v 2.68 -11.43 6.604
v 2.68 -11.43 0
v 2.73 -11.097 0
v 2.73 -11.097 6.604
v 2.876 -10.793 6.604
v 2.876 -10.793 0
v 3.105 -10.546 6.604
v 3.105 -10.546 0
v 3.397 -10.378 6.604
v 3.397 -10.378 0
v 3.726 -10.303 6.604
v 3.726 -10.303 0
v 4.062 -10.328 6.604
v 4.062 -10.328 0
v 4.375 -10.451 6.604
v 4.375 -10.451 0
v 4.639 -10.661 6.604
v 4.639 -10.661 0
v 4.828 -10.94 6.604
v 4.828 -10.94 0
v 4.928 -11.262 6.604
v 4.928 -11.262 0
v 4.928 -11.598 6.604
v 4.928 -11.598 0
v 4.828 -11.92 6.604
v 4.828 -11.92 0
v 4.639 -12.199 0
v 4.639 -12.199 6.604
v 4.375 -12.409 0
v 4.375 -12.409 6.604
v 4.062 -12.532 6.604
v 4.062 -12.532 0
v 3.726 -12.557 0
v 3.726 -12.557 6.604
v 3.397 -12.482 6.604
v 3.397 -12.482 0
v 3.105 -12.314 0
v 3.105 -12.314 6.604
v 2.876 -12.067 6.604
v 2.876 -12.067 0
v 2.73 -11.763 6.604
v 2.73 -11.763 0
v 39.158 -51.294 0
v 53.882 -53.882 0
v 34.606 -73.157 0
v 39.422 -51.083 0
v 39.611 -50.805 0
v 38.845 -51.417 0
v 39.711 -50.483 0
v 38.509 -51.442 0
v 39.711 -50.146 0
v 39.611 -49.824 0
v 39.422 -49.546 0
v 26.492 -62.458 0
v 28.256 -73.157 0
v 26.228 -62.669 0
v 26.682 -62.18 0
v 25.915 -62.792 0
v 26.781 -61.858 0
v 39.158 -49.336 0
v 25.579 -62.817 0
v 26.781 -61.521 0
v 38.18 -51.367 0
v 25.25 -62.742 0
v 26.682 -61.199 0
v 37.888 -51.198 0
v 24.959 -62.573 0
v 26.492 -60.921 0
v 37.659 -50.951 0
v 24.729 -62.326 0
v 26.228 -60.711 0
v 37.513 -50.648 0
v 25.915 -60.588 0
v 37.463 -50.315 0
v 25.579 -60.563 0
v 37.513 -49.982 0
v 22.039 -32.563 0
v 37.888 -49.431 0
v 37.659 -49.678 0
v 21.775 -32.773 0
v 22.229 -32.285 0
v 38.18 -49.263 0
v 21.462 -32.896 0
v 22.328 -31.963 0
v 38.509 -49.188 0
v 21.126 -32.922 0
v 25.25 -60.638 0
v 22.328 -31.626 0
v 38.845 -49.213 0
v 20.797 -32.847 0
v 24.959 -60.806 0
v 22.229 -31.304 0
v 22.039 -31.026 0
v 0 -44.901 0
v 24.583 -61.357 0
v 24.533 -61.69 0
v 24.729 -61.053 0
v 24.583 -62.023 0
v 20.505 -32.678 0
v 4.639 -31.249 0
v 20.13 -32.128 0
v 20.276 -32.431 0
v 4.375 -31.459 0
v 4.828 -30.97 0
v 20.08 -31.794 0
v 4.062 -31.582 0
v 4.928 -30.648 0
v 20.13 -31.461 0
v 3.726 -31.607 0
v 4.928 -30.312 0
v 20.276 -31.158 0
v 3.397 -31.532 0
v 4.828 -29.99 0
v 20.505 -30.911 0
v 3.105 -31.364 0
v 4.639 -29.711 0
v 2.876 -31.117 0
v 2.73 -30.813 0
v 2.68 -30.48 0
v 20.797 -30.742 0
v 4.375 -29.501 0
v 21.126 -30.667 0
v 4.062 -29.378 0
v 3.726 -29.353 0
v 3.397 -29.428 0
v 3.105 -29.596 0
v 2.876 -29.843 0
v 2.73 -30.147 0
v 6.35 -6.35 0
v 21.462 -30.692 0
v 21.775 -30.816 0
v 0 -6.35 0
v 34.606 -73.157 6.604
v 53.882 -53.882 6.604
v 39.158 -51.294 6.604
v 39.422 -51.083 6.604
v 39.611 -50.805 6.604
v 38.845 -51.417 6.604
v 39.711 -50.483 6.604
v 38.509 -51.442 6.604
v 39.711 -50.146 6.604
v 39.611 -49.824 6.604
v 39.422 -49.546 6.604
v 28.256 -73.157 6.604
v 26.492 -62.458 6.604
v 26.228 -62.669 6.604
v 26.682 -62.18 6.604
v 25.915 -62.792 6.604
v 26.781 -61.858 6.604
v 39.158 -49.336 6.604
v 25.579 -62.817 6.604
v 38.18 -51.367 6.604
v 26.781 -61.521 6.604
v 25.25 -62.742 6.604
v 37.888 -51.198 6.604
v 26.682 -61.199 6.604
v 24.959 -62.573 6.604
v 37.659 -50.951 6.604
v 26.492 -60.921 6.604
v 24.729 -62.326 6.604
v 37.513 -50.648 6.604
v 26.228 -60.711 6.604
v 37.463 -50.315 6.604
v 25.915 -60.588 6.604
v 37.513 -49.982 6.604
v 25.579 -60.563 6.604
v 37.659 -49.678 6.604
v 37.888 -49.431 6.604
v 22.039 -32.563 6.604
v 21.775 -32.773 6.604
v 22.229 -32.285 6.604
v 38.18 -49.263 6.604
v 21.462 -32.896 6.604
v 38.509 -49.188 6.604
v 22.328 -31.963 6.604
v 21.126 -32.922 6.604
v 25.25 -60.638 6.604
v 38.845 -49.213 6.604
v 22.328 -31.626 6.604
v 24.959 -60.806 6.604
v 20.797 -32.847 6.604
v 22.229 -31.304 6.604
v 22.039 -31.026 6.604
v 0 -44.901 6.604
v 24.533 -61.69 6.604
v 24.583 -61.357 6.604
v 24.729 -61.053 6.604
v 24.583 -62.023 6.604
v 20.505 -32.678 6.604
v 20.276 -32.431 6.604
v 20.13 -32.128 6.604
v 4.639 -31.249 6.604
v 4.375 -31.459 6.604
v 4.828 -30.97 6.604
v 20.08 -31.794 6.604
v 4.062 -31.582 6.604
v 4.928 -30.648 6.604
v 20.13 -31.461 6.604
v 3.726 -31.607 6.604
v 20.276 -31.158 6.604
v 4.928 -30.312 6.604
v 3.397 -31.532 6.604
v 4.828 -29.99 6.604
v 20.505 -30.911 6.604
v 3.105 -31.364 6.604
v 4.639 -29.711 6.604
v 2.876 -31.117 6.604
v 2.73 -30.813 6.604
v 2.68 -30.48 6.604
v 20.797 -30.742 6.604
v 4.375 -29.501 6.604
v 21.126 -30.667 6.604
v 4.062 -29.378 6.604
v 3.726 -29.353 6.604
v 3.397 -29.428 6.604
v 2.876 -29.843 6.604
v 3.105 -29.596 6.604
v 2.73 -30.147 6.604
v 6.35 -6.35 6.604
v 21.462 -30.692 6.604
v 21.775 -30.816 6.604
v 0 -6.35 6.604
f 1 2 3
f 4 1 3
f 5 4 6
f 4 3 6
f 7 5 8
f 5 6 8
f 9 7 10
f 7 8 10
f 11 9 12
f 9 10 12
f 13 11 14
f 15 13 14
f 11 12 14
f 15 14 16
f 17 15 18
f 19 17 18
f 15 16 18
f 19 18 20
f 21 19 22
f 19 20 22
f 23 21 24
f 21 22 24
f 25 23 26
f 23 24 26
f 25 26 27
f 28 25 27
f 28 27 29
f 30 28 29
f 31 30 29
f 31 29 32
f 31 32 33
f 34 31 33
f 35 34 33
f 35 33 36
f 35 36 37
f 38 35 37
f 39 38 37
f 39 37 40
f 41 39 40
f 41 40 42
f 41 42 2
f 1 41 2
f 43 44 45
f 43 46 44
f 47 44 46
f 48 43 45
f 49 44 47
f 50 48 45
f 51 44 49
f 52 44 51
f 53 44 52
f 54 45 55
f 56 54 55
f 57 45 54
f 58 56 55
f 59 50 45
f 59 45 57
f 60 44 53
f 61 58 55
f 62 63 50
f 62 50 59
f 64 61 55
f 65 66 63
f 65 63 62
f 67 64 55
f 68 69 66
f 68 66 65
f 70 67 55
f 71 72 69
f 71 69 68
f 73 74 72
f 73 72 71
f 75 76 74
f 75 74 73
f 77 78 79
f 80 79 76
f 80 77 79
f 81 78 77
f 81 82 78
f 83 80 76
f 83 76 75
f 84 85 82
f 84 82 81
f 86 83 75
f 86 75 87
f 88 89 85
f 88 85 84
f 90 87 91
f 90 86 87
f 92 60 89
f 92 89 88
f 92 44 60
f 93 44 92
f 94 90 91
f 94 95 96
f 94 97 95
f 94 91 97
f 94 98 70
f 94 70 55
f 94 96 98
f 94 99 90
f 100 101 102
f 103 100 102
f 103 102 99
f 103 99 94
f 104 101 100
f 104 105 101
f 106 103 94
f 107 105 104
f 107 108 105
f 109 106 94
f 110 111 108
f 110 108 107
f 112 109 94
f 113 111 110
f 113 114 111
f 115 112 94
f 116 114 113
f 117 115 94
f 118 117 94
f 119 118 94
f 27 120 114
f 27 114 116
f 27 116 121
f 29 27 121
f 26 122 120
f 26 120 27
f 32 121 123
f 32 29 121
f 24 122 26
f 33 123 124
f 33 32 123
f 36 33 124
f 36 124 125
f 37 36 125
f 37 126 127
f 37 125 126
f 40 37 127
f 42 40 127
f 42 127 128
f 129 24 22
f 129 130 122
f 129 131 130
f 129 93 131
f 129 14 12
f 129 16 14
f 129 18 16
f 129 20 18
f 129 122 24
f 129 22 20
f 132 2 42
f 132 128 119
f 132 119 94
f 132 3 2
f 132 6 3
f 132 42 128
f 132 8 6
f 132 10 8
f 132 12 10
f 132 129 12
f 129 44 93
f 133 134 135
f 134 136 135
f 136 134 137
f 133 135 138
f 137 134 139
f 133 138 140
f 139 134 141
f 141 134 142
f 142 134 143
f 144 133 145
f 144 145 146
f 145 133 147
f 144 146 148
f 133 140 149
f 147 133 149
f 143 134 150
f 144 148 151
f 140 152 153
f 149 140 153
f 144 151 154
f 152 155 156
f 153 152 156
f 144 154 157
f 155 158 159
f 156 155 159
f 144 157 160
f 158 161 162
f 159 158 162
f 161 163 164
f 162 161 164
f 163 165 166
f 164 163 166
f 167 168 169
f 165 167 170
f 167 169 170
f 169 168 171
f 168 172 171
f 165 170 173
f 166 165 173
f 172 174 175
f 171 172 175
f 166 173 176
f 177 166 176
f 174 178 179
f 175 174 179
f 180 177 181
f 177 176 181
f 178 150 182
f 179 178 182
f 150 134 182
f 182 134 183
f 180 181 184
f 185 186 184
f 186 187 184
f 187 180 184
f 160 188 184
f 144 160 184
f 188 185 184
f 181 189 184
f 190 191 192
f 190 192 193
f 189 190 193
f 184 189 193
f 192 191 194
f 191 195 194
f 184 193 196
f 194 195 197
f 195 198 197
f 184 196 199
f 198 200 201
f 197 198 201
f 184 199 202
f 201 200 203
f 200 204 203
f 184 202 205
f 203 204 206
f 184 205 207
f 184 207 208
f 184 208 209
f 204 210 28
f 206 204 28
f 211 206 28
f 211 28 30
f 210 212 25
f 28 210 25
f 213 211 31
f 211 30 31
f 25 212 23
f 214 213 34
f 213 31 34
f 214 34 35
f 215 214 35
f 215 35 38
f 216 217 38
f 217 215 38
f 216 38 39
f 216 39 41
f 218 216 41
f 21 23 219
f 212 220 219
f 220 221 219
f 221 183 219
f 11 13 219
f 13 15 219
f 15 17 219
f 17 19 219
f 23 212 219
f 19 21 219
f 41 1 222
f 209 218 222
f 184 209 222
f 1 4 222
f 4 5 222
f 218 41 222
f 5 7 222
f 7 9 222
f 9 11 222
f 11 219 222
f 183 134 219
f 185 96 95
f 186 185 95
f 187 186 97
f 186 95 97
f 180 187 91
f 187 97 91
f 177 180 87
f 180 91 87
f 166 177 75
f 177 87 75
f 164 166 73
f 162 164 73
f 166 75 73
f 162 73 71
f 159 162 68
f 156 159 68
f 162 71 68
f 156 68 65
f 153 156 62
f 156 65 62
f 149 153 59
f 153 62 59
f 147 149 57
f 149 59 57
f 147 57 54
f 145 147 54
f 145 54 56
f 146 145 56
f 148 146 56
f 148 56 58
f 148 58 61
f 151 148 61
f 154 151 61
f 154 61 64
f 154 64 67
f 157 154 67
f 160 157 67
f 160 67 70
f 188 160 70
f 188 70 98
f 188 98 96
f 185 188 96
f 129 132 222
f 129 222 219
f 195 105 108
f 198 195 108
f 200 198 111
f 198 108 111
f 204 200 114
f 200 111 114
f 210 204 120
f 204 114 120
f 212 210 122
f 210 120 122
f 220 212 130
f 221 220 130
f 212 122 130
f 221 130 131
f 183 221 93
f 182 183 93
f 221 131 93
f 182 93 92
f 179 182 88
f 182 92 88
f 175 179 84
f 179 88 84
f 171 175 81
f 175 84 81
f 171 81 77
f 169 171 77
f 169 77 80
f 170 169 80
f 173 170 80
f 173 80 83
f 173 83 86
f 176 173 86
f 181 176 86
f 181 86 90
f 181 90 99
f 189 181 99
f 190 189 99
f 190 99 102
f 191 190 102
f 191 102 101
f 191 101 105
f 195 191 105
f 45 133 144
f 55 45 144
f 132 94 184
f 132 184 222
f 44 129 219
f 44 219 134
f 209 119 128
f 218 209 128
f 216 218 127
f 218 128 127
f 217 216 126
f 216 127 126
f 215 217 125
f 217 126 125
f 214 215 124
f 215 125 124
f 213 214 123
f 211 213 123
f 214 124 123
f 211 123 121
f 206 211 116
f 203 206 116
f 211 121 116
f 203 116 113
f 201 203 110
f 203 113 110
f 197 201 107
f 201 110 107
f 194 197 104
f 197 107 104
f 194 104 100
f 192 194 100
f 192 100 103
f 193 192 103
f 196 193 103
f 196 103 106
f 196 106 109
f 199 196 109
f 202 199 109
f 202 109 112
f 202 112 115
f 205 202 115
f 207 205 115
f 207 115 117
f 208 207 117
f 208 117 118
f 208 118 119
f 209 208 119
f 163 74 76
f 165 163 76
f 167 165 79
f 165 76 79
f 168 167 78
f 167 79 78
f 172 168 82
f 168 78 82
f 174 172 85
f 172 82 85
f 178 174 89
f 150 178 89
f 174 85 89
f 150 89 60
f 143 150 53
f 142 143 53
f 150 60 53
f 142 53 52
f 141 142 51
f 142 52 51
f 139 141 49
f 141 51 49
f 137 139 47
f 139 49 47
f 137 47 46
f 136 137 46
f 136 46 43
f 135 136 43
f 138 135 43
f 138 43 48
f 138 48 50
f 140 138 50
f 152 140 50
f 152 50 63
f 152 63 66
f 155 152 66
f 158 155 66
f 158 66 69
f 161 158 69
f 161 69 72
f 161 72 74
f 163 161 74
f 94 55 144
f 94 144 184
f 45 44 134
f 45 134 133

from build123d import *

# Parameters (mm, degrees)
BOSS_EXTRUDE1_DEPTH       = 6.604
F_4_40_TAPPED_HOLE1_D     = 2.2606
F_4_40_TAPPED_HOLE1_DEPTH = 7.5946
F_4_40_TAPPED_HOLE1_TIP   = 0.679152758
CUT_EXTRUDE1_DEPTH        = 7.604


with BuildPart() as part:
    # Sketch1 → Boss-Extrude1 (new body)
    with BuildSketch(Plane.XY):
        Polygon((6.35, -6.35), (53.881536726, -53.881536726), (31.430896424, -76.332177029), (0, -44.901280605), (0, -6.35), align=None)
    extrude(amount=BOSS_EXTRUDE1_DEPTH)

    # #4-40 Tapped Hole1
    with Locations(Plane.XY.offset(6.604)):
        with Locations((3.81, -11.43), (3.81, -30.48), (25.663262225, -61.689692887), (21.210222222, -31.794452992), (38.593017634, -50.314669612)):
            Hole(F_4_40_TAPPED_HOLE1_D / 2, depth=F_4_40_TAPPED_HOLE1_DEPTH)
            with Locations((0, 0, -(F_4_40_TAPPED_HOLE1_DEPTH + F_4_40_TAPPED_HOLE1_TIP / 2))):  # 118° drill point
                Cone(0, F_4_40_TAPPED_HOLE1_D / 2, F_4_40_TAPPED_HOLE1_TIP, mode=Mode.SUBTRACT)

    # Sketch5 → Cut-Extrude1 (cut, through all)
    with BuildSketch(Plane.XY.offset(6.604)):
        Polygon((34.605896424, -73.157177029), (28.255896424, -73.157177029), (31.430896424, -76.332177029), align=None)
    extrude(amount=-CUT_EXTRUDE1_DEPTH, mode=Mode.SUBTRACT)


solid = part.part
